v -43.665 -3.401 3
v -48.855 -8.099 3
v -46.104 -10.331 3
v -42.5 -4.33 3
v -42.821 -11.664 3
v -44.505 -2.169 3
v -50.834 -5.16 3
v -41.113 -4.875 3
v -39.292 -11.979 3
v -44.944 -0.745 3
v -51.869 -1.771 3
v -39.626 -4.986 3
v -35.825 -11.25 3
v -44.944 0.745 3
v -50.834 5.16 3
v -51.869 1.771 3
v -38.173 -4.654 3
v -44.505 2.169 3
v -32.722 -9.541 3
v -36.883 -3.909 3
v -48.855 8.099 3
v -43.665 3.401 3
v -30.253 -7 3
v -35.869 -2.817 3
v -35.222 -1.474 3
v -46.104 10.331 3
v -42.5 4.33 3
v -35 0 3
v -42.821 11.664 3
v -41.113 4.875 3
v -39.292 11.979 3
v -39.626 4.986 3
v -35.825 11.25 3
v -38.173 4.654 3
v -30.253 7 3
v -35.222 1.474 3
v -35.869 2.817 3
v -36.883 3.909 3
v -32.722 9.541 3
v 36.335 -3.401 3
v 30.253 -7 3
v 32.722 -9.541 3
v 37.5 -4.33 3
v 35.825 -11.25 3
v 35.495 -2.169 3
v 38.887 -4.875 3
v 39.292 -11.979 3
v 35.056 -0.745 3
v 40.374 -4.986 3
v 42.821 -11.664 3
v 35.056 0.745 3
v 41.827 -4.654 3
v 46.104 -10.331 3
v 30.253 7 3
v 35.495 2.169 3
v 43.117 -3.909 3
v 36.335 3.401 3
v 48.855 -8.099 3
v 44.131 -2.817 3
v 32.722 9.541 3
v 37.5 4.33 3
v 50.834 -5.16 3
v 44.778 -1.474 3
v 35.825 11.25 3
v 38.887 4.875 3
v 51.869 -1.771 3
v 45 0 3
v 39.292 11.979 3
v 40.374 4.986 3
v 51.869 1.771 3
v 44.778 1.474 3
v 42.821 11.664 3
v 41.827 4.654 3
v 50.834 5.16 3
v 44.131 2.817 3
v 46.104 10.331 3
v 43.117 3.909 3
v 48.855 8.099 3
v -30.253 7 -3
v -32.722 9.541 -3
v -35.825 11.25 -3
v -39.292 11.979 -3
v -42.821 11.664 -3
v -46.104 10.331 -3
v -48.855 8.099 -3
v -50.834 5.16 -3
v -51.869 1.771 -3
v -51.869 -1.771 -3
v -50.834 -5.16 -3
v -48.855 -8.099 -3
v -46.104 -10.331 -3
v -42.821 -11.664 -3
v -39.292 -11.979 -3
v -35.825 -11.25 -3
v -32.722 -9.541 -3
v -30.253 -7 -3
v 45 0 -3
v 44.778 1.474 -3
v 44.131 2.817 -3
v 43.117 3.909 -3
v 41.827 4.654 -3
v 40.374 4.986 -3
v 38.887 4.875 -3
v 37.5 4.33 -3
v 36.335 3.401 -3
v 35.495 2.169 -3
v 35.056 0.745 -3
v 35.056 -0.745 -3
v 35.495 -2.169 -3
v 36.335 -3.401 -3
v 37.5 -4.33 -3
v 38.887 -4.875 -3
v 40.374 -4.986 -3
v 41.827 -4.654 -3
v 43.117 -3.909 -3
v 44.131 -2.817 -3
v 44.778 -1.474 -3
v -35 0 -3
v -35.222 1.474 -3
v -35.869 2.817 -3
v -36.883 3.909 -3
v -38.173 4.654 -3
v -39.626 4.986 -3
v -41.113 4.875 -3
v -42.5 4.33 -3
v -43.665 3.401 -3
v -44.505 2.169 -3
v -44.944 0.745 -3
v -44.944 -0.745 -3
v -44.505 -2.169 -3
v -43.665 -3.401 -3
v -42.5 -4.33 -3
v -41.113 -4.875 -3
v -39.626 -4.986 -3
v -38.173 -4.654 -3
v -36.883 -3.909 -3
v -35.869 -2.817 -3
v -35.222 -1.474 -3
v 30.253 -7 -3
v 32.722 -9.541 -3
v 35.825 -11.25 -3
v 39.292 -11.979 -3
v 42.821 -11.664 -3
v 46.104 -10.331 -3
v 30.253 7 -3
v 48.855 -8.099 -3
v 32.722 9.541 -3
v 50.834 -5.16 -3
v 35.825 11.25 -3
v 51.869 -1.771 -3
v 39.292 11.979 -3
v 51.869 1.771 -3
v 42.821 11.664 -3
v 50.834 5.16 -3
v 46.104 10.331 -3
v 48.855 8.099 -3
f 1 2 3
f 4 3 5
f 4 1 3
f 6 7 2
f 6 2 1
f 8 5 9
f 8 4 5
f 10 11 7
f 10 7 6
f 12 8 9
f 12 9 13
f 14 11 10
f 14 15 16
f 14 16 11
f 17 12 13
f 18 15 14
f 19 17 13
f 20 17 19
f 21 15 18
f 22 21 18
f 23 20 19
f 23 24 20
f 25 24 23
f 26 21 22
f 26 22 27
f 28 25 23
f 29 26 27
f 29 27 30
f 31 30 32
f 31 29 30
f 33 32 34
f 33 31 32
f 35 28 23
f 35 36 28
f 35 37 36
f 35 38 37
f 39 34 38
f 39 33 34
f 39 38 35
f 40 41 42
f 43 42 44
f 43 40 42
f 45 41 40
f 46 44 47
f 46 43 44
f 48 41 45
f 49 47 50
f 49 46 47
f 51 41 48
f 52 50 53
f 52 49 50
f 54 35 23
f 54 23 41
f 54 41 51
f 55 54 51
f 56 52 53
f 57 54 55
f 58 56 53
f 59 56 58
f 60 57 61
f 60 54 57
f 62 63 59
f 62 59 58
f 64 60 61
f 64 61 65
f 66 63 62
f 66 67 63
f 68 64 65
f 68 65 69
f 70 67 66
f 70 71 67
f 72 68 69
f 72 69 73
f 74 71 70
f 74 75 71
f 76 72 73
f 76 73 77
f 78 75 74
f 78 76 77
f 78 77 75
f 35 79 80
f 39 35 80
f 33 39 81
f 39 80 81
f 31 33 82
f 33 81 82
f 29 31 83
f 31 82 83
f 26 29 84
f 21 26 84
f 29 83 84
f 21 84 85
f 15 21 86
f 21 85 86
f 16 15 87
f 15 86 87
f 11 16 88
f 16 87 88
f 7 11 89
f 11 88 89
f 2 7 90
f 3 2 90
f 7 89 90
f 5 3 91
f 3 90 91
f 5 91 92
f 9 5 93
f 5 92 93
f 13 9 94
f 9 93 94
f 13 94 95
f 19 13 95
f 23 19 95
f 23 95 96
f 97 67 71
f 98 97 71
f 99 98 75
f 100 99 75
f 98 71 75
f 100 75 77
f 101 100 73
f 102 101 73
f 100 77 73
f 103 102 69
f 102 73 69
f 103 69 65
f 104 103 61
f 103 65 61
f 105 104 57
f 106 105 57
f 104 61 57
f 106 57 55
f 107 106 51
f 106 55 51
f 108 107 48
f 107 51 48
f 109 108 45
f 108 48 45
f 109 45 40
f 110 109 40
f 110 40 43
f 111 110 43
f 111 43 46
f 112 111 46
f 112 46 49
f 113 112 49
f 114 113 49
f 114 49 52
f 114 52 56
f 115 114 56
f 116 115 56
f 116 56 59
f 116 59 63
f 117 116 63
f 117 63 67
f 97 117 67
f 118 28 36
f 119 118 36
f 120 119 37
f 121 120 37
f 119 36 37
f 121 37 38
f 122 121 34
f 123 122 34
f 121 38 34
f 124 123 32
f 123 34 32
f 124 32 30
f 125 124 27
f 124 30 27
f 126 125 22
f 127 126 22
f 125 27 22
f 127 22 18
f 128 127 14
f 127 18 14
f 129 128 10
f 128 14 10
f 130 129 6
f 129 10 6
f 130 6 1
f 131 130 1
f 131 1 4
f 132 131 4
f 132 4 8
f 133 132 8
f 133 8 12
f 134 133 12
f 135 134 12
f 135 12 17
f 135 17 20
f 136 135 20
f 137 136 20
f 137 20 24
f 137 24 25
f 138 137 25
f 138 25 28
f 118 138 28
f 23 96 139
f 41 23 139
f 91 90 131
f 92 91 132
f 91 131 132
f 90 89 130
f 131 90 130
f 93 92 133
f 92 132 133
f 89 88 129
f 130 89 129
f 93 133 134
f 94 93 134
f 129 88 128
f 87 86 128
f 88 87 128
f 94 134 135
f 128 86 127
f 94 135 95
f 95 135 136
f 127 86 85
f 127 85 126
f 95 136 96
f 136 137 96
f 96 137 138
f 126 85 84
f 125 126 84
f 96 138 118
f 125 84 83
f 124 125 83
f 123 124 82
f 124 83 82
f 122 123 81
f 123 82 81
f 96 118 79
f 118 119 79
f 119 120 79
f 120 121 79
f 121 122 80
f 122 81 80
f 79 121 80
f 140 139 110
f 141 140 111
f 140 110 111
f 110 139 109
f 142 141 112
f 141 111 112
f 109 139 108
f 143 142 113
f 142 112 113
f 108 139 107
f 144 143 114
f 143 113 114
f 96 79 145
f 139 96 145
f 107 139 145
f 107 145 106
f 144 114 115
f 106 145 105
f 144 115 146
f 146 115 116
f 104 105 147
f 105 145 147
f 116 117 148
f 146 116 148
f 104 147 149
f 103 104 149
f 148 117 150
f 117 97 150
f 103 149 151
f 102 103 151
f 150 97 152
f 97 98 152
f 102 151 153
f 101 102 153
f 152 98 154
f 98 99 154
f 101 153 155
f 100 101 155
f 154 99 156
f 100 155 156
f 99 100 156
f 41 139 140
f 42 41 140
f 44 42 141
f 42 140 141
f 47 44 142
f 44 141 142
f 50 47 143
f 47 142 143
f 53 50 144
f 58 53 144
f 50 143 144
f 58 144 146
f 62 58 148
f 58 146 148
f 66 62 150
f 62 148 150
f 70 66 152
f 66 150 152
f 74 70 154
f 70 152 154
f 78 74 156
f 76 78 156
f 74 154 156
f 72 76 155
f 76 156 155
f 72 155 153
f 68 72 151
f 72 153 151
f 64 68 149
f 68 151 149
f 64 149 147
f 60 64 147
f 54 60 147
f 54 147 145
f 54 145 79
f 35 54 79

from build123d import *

# Parameters (mm, degrees)
EXTRUDE_START       = -3
EXTRUDE_1_DEPTH     = 6
SKETCH_2_R          = 5
CUT_EXTRUDE_1_DEPTH = 54.702886895


# Read off the part's stored shape, not the designer's step: 凸台-拉伸1
with BuildPart() as part:
    # 凸台-拉伸1 outline → 凸台-拉伸1 (new body)
    with BuildSketch(Plane.XY.offset(EXTRUDE_START)):
        with BuildLine():
            ThreePointArc((30.2532, -7), (52, 0), (30.2532, 7))
            Line((30.2532, 7), (-30.2532, 7))
            ThreePointArc((-30.2532, 7), (-52, 0), (-30.2532, -7))
            Line((-30.2532, -7), (30.2532, -7))
        make_face()
    extrude(amount=EXTRUDE_1_DEPTH)

    # 草图2 → 切除-拉伸1 (cut, through all)
    with BuildSketch(Plane.XY.offset(3)):
        with Locations((-40, 0)):
            Circle(SKETCH_2_R)
        with Locations((40, 0)):
            Circle(SKETCH_2_R)
    extrude(amount=-CUT_EXTRUDE_1_DEPTH, mode=Mode.SUBTRACT)


solid = part.part
